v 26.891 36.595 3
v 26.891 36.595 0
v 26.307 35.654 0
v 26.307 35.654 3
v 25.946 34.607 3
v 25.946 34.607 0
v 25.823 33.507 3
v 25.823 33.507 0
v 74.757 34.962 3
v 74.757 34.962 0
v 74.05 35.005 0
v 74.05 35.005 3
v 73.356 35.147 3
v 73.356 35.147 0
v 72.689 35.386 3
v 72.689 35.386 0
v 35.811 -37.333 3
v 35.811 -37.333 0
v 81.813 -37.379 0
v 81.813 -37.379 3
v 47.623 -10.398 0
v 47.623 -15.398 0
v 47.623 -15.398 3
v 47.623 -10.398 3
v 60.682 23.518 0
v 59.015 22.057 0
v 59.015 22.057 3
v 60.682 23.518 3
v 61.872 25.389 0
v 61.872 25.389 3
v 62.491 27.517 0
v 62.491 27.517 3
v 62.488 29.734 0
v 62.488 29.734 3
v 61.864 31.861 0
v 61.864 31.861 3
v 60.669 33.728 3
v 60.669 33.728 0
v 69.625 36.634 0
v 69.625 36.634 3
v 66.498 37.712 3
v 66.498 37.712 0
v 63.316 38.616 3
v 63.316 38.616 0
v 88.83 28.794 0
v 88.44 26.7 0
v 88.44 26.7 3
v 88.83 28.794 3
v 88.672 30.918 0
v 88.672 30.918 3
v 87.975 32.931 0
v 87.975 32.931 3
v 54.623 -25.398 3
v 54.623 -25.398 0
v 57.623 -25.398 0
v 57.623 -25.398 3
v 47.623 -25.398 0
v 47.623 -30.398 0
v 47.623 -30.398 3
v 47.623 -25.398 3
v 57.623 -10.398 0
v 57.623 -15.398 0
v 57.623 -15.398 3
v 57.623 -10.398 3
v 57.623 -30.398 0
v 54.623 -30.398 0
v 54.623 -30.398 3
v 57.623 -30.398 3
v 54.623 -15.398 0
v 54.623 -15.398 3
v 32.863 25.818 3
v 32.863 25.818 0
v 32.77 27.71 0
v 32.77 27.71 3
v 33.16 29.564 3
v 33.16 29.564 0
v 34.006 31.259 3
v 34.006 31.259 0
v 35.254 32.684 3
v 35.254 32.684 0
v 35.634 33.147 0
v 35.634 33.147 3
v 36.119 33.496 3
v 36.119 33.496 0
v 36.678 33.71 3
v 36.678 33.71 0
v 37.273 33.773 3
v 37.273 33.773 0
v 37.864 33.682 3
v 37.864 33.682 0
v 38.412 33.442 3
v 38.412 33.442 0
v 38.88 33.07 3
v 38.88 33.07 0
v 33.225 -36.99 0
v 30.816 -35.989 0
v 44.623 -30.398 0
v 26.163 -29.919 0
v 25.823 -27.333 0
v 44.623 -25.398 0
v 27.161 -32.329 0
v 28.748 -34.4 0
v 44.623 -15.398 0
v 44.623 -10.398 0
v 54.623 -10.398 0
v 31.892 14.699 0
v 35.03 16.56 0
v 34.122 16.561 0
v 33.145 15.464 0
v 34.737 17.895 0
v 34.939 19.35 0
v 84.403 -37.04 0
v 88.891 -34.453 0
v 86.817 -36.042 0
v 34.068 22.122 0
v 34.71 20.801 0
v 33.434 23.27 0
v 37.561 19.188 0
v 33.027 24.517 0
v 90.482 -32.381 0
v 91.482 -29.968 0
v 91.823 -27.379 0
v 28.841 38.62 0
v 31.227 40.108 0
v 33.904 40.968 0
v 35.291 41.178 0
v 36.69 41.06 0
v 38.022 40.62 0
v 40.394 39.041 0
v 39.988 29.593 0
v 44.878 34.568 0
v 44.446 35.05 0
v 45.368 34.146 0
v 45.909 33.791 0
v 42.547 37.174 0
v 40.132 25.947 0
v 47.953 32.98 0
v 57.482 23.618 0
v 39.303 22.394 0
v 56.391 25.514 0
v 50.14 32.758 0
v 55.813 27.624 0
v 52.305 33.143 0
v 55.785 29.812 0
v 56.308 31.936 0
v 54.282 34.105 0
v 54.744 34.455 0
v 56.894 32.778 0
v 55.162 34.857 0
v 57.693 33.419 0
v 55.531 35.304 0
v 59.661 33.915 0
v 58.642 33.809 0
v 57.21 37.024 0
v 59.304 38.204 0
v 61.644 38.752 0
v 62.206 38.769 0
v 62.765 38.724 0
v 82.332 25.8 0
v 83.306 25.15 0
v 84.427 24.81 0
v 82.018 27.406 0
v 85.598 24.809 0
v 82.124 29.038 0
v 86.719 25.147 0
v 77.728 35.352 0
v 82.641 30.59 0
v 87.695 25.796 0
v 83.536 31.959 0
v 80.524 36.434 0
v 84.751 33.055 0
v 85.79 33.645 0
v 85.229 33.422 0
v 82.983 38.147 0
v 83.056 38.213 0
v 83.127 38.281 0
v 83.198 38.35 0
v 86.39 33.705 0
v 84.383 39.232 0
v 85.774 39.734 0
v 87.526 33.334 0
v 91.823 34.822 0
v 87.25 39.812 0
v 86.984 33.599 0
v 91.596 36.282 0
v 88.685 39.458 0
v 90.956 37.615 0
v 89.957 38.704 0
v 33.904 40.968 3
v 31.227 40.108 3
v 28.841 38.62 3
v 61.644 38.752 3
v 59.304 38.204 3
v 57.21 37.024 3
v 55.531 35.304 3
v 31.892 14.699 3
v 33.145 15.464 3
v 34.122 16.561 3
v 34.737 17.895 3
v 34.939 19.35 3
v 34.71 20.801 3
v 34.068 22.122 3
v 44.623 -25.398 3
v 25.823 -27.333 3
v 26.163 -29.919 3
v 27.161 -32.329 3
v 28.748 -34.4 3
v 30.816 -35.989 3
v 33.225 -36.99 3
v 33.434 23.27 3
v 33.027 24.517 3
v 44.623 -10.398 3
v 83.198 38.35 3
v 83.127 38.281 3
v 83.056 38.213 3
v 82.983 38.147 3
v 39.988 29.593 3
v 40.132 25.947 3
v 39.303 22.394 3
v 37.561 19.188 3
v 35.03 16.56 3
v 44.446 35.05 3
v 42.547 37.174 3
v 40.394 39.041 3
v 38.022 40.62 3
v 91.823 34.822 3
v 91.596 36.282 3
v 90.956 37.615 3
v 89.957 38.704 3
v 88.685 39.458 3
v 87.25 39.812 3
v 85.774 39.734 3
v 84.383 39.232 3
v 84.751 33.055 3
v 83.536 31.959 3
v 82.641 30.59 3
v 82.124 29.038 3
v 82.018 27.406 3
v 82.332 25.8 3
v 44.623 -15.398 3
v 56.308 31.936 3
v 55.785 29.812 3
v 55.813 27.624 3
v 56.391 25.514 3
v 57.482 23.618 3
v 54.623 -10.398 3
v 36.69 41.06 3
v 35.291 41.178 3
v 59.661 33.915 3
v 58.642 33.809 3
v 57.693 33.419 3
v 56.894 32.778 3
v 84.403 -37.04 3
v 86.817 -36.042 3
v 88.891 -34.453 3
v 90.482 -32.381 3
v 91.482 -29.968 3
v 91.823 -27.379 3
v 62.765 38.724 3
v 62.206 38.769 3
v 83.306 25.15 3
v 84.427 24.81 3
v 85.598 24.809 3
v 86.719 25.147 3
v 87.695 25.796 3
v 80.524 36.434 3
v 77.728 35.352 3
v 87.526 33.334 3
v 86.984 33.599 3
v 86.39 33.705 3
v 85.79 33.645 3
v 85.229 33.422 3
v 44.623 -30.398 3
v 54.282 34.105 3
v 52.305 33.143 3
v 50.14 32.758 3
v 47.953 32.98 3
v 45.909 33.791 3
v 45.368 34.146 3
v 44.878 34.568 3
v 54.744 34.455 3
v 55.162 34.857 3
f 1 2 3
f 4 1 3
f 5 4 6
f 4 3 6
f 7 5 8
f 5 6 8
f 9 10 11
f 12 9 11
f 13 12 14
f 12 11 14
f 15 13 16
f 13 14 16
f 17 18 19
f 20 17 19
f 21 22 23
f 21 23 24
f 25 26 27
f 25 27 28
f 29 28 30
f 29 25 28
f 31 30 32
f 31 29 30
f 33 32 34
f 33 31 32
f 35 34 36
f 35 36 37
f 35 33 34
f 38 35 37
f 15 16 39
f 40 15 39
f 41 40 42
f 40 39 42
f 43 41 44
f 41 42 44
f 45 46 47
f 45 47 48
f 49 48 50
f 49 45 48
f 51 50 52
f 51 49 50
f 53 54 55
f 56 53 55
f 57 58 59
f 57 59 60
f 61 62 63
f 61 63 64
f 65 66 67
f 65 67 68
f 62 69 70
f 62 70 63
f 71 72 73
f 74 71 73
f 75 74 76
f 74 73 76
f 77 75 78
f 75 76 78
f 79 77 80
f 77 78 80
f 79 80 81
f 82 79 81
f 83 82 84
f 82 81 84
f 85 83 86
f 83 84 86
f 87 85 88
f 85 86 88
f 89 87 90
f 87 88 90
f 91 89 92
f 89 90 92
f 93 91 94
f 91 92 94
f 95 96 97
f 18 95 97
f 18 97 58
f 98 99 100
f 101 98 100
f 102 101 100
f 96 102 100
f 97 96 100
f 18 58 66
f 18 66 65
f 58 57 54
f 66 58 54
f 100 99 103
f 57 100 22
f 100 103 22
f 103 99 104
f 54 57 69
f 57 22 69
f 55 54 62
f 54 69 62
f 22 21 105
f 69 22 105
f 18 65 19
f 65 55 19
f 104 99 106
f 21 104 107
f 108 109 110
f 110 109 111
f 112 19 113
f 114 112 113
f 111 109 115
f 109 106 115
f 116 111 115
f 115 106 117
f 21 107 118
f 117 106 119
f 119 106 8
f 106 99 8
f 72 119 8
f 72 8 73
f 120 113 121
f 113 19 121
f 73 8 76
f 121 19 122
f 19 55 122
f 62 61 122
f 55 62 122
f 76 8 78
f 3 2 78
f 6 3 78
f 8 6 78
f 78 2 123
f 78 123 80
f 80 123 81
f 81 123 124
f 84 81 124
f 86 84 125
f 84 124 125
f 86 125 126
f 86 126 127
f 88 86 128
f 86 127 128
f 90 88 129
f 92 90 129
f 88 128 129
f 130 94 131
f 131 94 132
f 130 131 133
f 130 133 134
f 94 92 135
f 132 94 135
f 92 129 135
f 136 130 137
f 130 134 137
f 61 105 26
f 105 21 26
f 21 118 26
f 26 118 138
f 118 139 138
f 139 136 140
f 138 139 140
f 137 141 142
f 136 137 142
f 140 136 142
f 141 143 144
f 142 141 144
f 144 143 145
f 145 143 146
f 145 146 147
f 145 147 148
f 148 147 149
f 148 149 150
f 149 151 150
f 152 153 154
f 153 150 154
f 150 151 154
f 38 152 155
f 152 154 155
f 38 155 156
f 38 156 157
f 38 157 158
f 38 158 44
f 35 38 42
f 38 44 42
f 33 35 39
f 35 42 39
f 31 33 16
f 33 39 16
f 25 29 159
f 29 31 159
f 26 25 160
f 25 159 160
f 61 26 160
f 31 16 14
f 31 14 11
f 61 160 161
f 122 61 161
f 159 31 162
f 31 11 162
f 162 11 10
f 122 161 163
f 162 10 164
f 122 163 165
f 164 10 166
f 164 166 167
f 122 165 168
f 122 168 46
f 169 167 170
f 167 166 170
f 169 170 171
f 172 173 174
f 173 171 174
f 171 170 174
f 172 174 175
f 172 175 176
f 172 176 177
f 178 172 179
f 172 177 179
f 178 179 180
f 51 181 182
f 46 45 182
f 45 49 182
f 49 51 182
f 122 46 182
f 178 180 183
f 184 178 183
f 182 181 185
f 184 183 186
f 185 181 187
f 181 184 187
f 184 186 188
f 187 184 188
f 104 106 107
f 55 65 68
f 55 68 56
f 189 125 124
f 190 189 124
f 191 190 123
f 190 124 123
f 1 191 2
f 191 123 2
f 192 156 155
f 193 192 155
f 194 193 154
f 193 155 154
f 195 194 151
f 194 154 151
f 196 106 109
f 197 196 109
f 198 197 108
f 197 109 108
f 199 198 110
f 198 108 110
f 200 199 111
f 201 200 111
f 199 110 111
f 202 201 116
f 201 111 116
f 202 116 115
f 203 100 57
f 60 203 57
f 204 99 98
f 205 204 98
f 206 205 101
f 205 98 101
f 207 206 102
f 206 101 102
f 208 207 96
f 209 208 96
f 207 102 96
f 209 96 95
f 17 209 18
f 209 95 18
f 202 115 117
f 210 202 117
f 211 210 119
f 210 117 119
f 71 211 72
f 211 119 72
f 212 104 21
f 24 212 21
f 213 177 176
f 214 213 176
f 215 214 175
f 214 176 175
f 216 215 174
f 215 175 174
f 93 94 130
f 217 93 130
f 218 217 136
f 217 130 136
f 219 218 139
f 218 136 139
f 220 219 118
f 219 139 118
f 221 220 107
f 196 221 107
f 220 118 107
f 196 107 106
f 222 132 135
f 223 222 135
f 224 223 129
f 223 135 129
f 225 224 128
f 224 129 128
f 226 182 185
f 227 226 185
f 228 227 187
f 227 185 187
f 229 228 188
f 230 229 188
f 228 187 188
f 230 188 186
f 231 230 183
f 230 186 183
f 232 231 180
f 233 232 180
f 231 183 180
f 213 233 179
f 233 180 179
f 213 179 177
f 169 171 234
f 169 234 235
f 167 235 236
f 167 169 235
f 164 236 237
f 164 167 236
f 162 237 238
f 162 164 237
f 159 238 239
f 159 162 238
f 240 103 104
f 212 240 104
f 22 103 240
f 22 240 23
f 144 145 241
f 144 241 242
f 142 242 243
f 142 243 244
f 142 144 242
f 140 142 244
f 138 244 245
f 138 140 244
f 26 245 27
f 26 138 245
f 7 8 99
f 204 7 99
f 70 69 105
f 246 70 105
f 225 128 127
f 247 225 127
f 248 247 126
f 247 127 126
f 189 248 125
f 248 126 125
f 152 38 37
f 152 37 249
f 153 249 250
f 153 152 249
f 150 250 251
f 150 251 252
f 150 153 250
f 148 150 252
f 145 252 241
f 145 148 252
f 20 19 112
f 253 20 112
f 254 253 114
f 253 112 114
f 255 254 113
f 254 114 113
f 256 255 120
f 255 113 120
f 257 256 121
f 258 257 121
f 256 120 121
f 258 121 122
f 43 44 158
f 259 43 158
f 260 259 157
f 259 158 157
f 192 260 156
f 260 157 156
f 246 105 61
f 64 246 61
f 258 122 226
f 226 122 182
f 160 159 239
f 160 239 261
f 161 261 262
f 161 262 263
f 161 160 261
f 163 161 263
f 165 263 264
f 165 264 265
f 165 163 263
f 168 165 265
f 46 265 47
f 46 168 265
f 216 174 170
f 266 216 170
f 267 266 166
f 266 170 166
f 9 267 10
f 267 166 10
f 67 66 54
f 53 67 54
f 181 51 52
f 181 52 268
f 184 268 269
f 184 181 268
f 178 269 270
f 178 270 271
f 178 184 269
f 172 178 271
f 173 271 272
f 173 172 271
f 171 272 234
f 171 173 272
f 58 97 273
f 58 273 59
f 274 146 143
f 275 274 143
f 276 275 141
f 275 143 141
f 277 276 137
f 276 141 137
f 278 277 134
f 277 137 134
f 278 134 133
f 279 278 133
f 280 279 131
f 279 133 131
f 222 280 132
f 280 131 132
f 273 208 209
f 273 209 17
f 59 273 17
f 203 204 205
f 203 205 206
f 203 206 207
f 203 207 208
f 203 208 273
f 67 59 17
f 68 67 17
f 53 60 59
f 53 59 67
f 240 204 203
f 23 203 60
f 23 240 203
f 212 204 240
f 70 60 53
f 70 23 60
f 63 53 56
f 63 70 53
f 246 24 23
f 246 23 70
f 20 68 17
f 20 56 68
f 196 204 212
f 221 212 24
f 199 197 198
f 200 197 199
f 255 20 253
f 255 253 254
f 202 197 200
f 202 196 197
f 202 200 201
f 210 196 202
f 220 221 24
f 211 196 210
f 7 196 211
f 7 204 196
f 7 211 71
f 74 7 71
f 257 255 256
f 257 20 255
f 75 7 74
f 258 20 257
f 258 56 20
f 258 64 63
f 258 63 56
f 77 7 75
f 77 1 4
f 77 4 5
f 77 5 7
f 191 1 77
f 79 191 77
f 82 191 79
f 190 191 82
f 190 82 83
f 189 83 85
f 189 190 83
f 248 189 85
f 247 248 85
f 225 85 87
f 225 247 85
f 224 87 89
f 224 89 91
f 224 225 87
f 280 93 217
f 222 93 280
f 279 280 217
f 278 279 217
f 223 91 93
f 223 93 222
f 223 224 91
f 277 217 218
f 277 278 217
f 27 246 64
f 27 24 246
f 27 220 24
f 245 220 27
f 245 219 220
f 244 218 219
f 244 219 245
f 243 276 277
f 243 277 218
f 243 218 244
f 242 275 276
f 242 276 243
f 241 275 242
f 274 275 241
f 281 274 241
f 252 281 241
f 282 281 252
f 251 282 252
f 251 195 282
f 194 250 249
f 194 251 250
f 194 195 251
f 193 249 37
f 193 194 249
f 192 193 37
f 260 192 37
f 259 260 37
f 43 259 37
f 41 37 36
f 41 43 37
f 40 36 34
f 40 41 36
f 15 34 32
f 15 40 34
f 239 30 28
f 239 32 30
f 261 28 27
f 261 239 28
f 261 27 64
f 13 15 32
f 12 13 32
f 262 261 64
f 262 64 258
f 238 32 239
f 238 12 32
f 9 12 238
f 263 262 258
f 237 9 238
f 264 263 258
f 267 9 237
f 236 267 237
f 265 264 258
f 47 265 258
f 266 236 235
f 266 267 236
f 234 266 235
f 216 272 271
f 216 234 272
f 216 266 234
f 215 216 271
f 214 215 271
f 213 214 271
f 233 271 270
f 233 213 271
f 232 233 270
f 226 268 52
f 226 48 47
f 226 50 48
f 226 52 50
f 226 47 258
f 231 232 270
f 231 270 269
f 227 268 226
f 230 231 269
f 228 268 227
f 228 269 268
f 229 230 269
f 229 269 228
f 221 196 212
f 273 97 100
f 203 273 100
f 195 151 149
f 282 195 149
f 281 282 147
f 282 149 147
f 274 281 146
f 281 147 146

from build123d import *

# Parameters (mm, degrees)
MODEL_W                 = 3
MODEL_H                 = 5
SALIENTE_EXTRUIR1_DEPTH = 3


with BuildPart() as part:
    # Model → Saliente-Extruir1 (new body)
    with BuildSketch(Plane.XY):
        with BuildLine():
            Line((25.823008531, 25.328827472), (25.823008531, -27.332866004))
            ThreePointArc((25.823008531, -27.332866004), (28.747771663, -34.399762301), (35.811213184, -37.332859048))
            Line((35.811213184, -37.332859048), (81.813268997, -37.378641912))
            ThreePointArc((81.813268997, -37.378641912), (88.89063275, -34.453157454), (91.823009601, -27.378646656))
            Line((91.823009601, -27.378646656), (91.823009601, 34.821697163))
            ThreePointArc((91.823009601, 34.821697163), (88.685239194, 39.45821871), (83.197638532, 38.349537442))
            ThreePointArc((83.197638532, 38.349537442), (83.091891778, 38.246548616), (82.983150977, 38.146726212))
            ThreePointArc((82.983150977, 38.146726212), (79.158392414, 35.809046345), (74.756507073, 34.962328761))
            ThreePointArc((74.756507073, 34.962328761), (73.700057315, 35.063620335), (72.68878473, 35.38560455))
            ThreePointArc((72.68878473, 35.38560455), (68.069225879, 37.194690132), (63.316100845, 38.616279747))
            ThreePointArc((63.316100845, 38.616279747), (62.485957107, 38.754544477), (61.644382862, 38.751619998))
            ThreePointArc((61.644382862, 38.751619998), (58.215145594, 37.688534886), (55.531115502, 35.304043186))
            ThreePointArc((55.531115502, 35.304043186), (54.958944511, 34.649794571), (54.282120522, 34.104514662))
            ThreePointArc((54.282120522, 34.104514662), (50.140040935, 32.758182229), (45.908966143, 33.791352311))
            ThreePointArc((45.908966143, 33.791352311), (45.116243353, 34.349525285), (44.446145174, 35.050192768))
            ThreePointArc((44.446145174, 35.050192768), (41.500295, 38.141911881), (38.022338936, 40.619931641))
            ThreePointArc((38.022338936, 40.619931641), (35.993879777, 41.16016146), (33.903505077, 40.96825411))
            ThreePointArc((33.903505077, 40.96825411), (29.987740451, 39.437981004), (26.890761417, 36.594801579))
            ThreePointArc((26.890761417, 36.594801579), (26.097480223, 35.140352586), (25.823008531, 33.506528172))
            Line((25.823008531, 33.506528172), (25.823008531, 25.328827472))
        make_face()
        with Locations((56.123009601, -12.898202125)):
            Rectangle(MODEL_W, MODEL_H, mode=Mode.SUBTRACT)
        with Locations((46.123009601, -12.898202125)):
            Rectangle(MODEL_W, MODEL_H, mode=Mode.SUBTRACT)
        with Locations((56.123009601, -27.898202125)):
            Rectangle(MODEL_W, MODEL_H, mode=Mode.SUBTRACT)
        with Locations((46.123009601, -27.898202125)):
            Rectangle(MODEL_W, MODEL_H, mode=Mode.SUBTRACT)
        with BuildLine():
            ThreePointArc((31.891647008, 14.698529627), (34.737479764, 17.894903167), (34.068174805, 22.121911417))
            ThreePointArc((34.068174805, 22.121911417), (33.201238031, 23.883836719), (32.862791652, 25.818110274))
            ThreePointArc((32.862791652, 25.818110274), (33.159875497, 29.564217988), (35.254372097, 32.684260585))
            ThreePointArc((35.254372097, 32.684260585), (36.97332261, 33.76093452), (38.880316643, 33.069999366))
            ThreePointArc((38.880316643, 33.069999366), (39.303180243, 22.39412756), (31.891647008, 14.698529627))
        make_face(mode=Mode.SUBTRACT)
        with BuildLine():
            ThreePointArc((60.669464902, 33.72846753), (58.153624192, 33.64814712), (56.308435323, 31.936077063))
            ThreePointArc((56.308435323, 31.936077063), (56.034810359, 26.550644681), (59.015292929, 22.056818226))
            ThreePointArc((59.015292929, 22.056818226), (62.490702694, 27.517307494), (60.669464902, 33.72846753))
        make_face(mode=Mode.SUBTRACT)
        with BuildLine():
            ThreePointArc((87.974912144, 32.931323036), (86.39007686, 33.704958001), (84.750501033, 33.055338848))
            ThreePointArc((84.750501033, 33.055338848), (82.332342702, 29.830877737), (82.3321927, 25.800413849))
            ThreePointArc((82.3321927, 25.800413849), (85.598214893, 24.80893095), (88.439971438, 26.699528486))
            ThreePointArc((88.439971438, 26.699528486), (88.820060436, 29.86114357), (87.974912144, 32.931323036))
        make_face(mode=Mode.SUBTRACT)
    extrude(amount=SALIENTE_EXTRUIR1_DEPTH)


solid = part.part
